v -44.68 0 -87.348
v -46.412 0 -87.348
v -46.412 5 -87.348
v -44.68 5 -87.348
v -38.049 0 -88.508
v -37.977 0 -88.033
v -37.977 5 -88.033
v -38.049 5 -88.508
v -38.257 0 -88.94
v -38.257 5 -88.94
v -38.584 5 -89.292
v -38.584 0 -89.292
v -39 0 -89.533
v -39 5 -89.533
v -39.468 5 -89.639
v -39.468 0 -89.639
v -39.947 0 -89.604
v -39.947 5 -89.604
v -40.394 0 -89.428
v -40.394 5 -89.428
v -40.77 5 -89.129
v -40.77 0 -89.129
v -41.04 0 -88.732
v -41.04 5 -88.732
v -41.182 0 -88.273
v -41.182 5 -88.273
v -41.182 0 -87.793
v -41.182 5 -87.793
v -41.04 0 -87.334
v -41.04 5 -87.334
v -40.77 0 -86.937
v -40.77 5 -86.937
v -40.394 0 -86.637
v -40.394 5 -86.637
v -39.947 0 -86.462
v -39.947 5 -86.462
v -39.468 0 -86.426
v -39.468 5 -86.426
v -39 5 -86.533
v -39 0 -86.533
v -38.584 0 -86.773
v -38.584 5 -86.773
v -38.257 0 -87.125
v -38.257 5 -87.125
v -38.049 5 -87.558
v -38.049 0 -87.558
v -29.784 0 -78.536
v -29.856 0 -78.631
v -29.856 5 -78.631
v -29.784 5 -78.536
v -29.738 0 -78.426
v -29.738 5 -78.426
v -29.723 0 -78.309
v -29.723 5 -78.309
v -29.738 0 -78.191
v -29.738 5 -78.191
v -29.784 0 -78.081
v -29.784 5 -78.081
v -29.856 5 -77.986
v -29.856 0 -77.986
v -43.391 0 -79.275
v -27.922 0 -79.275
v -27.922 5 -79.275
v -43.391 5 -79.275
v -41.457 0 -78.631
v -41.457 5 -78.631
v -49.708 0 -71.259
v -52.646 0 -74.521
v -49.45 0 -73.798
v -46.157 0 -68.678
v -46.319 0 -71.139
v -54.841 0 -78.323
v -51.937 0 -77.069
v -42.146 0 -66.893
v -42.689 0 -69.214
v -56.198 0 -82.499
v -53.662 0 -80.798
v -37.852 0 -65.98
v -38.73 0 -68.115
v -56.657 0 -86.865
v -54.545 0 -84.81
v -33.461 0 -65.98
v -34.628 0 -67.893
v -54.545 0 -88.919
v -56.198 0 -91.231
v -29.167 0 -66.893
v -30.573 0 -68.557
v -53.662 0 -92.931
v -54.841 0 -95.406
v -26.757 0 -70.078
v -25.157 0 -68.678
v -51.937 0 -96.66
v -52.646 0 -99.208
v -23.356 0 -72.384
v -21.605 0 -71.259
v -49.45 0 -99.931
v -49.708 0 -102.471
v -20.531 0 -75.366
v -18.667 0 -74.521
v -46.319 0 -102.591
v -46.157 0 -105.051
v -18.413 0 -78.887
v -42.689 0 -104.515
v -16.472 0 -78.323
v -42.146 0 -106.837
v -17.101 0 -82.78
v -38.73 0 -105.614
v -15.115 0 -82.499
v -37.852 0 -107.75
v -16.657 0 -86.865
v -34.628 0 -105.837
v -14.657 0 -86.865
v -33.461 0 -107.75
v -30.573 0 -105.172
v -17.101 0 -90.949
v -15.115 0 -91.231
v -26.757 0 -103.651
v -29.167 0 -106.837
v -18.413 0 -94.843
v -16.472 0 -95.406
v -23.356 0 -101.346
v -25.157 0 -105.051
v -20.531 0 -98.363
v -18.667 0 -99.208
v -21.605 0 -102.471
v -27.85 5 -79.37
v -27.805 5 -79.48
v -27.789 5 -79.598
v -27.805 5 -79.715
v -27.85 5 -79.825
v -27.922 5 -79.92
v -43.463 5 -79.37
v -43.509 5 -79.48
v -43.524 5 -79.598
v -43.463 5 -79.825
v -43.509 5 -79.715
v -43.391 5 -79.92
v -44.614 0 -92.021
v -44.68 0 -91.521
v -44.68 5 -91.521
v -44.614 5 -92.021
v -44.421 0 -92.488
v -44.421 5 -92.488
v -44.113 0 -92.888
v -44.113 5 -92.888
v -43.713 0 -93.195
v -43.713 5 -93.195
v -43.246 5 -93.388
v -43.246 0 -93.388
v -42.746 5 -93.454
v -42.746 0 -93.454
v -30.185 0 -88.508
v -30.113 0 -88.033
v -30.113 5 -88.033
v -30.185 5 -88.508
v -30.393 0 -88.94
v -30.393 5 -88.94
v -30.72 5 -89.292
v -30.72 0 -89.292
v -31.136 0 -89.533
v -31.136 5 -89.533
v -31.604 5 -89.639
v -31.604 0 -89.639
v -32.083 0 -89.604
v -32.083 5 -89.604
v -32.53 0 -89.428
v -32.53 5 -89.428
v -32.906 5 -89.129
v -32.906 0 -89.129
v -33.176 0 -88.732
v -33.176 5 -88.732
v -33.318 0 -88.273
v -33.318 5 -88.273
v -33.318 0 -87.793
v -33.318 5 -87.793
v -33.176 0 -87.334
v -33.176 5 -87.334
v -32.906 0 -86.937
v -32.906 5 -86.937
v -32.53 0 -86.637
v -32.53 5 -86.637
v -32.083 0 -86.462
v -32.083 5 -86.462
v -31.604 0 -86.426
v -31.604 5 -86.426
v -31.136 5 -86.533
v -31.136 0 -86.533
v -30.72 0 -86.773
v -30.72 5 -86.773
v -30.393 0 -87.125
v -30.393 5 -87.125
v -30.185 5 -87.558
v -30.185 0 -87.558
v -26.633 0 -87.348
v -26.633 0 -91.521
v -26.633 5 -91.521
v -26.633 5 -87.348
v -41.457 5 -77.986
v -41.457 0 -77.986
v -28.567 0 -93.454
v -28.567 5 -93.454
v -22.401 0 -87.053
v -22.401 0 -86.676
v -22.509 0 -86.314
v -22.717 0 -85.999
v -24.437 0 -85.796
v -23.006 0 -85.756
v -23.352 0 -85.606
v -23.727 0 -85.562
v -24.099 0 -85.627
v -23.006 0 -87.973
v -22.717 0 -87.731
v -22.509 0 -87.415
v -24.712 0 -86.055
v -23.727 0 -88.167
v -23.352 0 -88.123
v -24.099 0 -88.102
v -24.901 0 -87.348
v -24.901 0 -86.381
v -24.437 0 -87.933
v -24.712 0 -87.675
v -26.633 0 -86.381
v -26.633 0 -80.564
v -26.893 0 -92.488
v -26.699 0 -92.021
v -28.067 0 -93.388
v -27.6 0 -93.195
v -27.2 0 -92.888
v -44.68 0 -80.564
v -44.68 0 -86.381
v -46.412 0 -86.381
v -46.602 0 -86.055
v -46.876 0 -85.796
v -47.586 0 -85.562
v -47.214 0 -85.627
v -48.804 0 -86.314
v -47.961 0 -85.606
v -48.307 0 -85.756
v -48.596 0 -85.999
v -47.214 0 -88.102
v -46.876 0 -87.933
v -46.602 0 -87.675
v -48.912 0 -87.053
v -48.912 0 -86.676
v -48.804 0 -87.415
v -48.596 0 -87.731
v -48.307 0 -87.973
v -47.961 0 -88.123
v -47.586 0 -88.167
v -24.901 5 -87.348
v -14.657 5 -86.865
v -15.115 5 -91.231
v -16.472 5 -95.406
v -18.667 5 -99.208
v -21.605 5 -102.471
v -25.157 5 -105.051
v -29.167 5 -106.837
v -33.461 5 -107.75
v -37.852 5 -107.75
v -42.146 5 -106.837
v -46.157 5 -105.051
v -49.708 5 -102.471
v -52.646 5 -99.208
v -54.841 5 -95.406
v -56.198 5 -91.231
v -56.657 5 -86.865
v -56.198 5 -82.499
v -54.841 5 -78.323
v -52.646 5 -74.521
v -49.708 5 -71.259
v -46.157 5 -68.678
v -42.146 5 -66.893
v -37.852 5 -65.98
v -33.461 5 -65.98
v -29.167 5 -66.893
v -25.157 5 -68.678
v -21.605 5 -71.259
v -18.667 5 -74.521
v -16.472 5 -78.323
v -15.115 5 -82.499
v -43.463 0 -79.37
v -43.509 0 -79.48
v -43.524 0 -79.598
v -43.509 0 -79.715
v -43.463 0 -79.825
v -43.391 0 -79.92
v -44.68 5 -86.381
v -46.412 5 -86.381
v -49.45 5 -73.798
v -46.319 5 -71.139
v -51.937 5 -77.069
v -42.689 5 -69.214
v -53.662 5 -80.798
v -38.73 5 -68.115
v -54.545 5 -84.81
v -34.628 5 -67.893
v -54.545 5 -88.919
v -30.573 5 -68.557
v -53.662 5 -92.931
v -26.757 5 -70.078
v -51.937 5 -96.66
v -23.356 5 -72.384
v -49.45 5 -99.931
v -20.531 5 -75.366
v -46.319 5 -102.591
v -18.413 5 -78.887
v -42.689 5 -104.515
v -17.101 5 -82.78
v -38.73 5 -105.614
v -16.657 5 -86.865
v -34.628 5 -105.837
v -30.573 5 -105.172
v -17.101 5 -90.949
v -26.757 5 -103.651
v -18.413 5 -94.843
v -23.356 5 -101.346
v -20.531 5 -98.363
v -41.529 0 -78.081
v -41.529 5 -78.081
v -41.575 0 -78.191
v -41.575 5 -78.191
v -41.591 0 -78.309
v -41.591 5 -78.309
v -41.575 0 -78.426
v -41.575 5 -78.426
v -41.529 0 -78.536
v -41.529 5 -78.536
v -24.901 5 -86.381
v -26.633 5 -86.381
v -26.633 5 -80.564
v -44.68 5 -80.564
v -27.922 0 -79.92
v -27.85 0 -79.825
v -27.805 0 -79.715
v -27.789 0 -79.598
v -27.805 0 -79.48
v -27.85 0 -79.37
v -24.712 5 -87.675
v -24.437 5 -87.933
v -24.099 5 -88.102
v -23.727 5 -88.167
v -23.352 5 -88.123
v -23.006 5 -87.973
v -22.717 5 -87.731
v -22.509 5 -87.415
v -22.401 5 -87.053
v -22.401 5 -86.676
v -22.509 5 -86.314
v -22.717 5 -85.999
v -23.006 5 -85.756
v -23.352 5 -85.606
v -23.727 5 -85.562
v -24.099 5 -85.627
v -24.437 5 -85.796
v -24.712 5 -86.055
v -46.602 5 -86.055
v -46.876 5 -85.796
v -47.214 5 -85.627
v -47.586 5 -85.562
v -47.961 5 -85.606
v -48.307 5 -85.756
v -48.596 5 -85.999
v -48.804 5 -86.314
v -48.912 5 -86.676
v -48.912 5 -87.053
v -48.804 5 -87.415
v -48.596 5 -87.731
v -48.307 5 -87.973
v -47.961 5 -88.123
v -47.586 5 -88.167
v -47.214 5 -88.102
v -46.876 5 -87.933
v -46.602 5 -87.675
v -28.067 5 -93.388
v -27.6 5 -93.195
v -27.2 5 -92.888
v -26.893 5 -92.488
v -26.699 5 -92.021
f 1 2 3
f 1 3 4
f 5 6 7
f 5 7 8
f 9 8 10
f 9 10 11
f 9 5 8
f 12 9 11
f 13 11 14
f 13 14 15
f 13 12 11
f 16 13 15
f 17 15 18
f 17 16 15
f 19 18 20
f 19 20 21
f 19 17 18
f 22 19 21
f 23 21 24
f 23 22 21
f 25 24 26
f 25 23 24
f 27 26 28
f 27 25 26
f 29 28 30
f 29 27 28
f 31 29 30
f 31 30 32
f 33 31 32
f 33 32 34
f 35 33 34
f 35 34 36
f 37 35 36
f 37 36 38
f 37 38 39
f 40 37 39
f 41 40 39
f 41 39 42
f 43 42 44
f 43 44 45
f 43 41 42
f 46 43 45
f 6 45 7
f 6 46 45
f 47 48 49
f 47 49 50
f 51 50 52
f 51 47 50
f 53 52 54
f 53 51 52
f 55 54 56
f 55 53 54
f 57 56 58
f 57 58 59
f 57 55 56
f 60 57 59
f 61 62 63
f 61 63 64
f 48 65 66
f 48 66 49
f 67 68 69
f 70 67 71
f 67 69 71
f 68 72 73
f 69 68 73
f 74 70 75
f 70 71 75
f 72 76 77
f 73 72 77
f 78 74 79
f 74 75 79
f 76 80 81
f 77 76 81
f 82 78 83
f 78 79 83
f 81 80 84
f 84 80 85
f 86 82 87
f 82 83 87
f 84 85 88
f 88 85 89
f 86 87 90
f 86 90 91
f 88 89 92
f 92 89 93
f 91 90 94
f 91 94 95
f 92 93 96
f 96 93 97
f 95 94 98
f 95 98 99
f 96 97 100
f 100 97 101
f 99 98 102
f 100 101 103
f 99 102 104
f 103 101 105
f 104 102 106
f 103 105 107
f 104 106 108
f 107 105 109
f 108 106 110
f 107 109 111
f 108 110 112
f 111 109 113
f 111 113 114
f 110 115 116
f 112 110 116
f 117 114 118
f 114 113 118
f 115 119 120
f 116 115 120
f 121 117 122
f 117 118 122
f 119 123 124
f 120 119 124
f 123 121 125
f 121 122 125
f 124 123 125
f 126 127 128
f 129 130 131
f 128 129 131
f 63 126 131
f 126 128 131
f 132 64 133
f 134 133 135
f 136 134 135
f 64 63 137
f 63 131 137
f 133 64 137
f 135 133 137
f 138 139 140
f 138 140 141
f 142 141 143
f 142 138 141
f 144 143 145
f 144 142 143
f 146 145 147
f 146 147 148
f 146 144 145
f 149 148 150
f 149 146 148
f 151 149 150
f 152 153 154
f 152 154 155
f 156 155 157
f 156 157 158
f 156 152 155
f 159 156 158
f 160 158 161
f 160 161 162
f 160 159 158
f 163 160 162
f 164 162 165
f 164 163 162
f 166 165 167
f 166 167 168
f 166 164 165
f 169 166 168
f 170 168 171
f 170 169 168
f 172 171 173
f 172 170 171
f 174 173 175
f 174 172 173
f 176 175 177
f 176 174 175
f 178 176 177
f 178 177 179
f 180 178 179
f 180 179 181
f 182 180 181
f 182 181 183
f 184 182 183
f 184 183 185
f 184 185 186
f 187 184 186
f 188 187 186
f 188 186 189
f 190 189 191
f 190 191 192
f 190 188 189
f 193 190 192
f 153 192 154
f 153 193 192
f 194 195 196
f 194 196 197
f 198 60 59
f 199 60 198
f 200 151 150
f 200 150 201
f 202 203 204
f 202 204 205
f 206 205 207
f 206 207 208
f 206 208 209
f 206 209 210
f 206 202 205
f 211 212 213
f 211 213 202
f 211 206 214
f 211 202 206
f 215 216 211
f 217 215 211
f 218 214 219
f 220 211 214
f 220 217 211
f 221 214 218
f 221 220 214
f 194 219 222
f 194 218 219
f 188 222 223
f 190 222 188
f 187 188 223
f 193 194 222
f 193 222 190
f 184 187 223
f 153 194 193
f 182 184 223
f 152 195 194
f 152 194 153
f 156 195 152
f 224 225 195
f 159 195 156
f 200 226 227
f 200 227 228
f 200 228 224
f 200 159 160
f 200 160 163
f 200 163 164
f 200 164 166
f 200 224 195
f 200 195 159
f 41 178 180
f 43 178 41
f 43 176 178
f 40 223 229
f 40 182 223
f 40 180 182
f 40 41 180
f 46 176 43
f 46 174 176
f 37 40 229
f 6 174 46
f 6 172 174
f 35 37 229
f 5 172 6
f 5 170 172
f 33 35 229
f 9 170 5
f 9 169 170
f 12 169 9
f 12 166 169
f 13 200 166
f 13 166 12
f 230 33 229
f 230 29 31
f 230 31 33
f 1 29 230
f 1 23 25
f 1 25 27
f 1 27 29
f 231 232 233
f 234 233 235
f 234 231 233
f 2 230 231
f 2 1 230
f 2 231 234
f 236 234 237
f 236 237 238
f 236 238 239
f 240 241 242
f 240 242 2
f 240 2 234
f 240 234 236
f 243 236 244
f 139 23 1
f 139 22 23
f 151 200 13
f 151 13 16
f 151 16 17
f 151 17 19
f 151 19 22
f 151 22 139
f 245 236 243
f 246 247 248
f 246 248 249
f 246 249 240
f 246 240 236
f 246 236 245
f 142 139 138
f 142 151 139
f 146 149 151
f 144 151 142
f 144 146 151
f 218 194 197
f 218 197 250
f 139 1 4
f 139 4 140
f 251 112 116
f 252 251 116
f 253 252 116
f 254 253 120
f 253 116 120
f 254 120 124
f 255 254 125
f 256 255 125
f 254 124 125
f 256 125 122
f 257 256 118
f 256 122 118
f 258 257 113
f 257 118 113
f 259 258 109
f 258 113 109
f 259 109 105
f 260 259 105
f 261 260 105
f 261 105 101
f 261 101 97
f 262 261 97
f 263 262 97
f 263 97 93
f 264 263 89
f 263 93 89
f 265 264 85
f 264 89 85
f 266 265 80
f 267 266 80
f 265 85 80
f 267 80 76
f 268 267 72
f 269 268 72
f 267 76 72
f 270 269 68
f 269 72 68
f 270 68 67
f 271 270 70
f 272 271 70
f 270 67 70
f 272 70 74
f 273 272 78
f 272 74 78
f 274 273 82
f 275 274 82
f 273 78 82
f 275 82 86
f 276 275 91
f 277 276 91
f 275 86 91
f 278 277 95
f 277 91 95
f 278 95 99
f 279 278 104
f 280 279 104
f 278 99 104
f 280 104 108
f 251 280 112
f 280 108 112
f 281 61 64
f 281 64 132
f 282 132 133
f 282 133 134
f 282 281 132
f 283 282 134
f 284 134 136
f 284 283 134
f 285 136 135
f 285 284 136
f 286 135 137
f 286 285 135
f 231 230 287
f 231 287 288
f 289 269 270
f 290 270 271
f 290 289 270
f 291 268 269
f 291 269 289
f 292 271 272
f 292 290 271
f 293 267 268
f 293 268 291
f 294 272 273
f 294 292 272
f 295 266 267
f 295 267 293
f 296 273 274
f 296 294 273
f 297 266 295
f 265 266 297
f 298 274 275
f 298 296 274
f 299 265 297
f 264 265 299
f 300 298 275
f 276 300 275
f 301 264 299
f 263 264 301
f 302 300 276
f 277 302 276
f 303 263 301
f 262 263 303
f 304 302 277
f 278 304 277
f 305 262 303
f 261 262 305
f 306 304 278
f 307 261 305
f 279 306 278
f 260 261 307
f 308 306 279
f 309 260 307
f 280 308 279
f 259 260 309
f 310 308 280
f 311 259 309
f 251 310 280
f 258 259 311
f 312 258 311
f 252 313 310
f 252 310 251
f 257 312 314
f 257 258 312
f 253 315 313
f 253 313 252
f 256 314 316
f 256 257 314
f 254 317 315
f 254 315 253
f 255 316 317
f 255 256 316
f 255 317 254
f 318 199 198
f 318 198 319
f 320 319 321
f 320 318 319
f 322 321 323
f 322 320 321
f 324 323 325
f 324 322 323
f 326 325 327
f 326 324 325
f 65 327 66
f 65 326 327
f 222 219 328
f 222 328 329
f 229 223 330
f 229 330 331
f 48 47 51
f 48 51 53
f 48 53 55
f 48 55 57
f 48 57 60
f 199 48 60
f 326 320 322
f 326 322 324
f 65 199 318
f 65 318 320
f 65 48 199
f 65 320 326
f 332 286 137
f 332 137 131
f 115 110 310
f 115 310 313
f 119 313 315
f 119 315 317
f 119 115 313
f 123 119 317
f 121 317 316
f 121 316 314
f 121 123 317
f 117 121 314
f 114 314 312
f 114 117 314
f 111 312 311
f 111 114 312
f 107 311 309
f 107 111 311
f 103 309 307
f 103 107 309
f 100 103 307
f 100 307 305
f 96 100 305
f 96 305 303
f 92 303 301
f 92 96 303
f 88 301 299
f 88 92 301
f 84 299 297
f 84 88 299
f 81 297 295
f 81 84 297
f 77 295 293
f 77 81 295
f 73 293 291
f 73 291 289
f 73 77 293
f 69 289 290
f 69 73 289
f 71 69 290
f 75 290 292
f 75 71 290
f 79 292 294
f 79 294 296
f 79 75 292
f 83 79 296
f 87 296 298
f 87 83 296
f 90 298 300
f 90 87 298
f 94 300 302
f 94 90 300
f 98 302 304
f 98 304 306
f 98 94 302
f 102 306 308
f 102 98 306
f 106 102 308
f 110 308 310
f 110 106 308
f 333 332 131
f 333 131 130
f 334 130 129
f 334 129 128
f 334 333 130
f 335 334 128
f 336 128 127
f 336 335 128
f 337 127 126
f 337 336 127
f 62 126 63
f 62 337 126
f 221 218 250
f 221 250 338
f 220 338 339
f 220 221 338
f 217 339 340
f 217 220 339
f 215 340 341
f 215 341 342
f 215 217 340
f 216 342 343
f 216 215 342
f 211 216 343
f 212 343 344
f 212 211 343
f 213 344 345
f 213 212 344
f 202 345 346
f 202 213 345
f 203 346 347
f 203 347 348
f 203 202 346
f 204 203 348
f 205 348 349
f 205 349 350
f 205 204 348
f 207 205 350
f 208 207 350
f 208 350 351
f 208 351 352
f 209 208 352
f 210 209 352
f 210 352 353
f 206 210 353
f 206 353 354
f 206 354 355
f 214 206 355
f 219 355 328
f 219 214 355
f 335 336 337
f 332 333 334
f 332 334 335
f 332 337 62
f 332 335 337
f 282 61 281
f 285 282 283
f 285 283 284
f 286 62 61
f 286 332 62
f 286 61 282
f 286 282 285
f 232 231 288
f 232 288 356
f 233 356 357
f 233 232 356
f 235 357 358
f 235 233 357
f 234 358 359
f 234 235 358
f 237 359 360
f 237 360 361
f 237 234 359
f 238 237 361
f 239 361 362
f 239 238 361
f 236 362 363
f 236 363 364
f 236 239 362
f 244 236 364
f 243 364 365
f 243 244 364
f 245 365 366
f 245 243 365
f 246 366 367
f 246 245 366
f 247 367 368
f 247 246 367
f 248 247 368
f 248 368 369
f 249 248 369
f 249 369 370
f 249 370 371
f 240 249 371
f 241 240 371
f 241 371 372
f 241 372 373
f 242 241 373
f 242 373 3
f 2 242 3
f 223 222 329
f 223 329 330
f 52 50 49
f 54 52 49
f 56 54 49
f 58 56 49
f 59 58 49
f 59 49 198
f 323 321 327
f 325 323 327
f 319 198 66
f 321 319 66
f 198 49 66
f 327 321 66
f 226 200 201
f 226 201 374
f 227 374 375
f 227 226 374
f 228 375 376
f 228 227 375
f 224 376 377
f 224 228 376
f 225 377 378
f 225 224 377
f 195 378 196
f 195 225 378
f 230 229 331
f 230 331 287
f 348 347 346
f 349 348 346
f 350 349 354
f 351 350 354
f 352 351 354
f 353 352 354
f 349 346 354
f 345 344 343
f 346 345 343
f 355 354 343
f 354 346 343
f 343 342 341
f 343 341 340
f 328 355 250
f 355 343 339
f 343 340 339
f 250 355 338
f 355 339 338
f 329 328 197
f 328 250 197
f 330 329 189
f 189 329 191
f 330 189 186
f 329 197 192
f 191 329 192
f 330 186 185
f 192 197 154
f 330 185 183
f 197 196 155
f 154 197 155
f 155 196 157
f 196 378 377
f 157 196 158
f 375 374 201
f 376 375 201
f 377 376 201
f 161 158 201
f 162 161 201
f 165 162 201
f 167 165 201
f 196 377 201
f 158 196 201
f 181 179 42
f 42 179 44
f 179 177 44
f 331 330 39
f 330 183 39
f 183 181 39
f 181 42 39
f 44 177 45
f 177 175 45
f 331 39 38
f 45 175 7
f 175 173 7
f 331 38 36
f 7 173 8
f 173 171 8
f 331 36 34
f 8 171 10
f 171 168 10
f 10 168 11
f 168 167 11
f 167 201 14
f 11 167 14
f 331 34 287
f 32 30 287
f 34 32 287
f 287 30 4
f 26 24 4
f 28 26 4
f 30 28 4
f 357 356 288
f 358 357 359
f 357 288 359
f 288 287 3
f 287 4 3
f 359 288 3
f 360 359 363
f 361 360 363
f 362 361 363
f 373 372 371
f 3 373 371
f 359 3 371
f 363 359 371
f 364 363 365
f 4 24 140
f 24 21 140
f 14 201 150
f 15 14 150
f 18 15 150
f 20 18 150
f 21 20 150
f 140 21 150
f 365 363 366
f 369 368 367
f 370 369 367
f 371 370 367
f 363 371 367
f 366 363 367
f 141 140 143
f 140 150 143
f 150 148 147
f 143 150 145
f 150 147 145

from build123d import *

# Parameters (mm, degrees)
SKETCH1_R             = 21
SKETCH1_R_2           = 19
BOSS_EXTRUDE1_DEPTH   = 5
SKETCH1_R_3           = 1.611255347
BOSS_EXTRUDE1_2_DEPTH = 5
BOSS_EXTRUDE1_3_DEPTH = 5
BOSS_EXTRUDE1_4_DEPTH = 5


with BuildPart() as part:
    # Sketch1 → Boss-Extrude1 (new body)
    with BuildSketch(Plane(origin=(0, 0, 0), x_dir=(1, 0, 0), z_dir=(0, 1, 0))):
        with Locations((-35.656522361, 86.864706092)):
            Circle(SKETCH1_R)
        with Locations((-35.656522361, 86.864706092)):
            Circle(SKETCH1_R_2, mode=Mode.SUBTRACT)
    extrude(amount=BOSS_EXTRUDE1_DEPTH)


with BuildPart() as body_2:
    # Sketch1 → Boss-Extrude1 2 (new body)
    with BuildSketch(Plane(origin=(0, 0, 0), x_dir=(1, 0, 0), z_dir=(0, 1, 0))):
        with BuildLine():
            Line((-26.633492417, 91.520801428), (-26.633492417, 87.348082696))
            Line((-26.633492417, 87.348082696), (-24.900858961, 87.348082696))
            ThreePointArc((-24.900858961, 87.348082696), (-22.38740856, 86.864706092), (-24.900858961, 86.381329488))
            Line((-24.900858961, 86.381329488), (-26.633492417, 86.381329488))
            Line((-26.633492417, 86.381329488), (-26.633492417, 80.564265068))
            Line((-26.633492417, 80.564265068), (-44.679552304, 80.564265068))
            Line((-44.679552304, 80.564265068), (-44.679552304, 86.381329488))
            Line((-44.679552304, 86.381329488), (-46.412185761, 86.381329488))
            ThreePointArc((-46.412185761, 86.381329488), (-48.925636161, 86.864706092), (-46.412185761, 87.348082696))
            Line((-46.412185761, 87.348082696), (-44.679552304, 87.348082696))
            Line((-44.679552304, 87.348082696), (-44.679552304, 91.520801428))
            ThreePointArc((-44.679552304, 91.520801428), (-44.113241386, 92.887996927), (-42.746045888, 93.454307845))
            Line((-42.746045888, 93.454307845), (-28.566998833, 93.454307845))
            ThreePointArc((-28.566998833, 93.454307845), (-27.199803335, 92.887996927), (-26.633492417, 91.520801428))
        make_face()
        with Locations((-39.588392261, 88.032660088)):
            Circle(SKETCH1_R_3, mode=Mode.SUBTRACT)
        with Locations((-31.72465246, 88.032660088)):
            Circle(SKETCH1_R_3, mode=Mode.SUBTRACT)
    extrude(amount=BOSS_EXTRUDE1_2_DEPTH)


with BuildPart() as body_3:
    # Sketch1 → Boss-Extrude1 3 (new body)
    with BuildSketch(Plane(origin=(0, 0, 0), x_dir=(1, 0, 0), z_dir=(0, 1, 0))):
        with BuildLine():
            ThreePointArc((-29.856003111, 78.630758651), (-29.722522348, 78.308507582), (-29.856003111, 77.986256512))
            Line((-29.856003111, 77.986256512), (-41.45704161, 77.986256512))
            ThreePointArc((-41.45704161, 77.986256512), (-41.590522374, 78.308507582), (-41.45704161, 78.630758651))
            Line((-41.45704161, 78.630758651), (-29.856003111, 78.630758651))
        make_face()
    extrude(amount=BOSS_EXTRUDE1_3_DEPTH)


with BuildPart() as body_4:
    # Sketch1 → Boss-Extrude1 4 (new body)
    with BuildSketch(Plane(origin=(0, 0, 0), x_dir=(1, 0, 0), z_dir=(0, 1, 0))):
        with BuildLine():
            ThreePointArc((-27.922496694, 79.919762929), (-27.789015931, 79.597511859), (-27.922496694, 79.27526079))
            Line((-27.922496694, 79.27526079), (-43.390548027, 79.27526079))
            ThreePointArc((-43.390548027, 79.27526079), (-43.52402879, 79.597511859), (-43.390548027, 79.919762929))
            Line((-43.390548027, 79.919762929), (-27.922496694, 79.919762929))
        make_face()
    extrude(amount=BOSS_EXTRUDE1_4_DEPTH)


solid = Compound([part.part, body_2.part, body_3.part, body_4.part])
